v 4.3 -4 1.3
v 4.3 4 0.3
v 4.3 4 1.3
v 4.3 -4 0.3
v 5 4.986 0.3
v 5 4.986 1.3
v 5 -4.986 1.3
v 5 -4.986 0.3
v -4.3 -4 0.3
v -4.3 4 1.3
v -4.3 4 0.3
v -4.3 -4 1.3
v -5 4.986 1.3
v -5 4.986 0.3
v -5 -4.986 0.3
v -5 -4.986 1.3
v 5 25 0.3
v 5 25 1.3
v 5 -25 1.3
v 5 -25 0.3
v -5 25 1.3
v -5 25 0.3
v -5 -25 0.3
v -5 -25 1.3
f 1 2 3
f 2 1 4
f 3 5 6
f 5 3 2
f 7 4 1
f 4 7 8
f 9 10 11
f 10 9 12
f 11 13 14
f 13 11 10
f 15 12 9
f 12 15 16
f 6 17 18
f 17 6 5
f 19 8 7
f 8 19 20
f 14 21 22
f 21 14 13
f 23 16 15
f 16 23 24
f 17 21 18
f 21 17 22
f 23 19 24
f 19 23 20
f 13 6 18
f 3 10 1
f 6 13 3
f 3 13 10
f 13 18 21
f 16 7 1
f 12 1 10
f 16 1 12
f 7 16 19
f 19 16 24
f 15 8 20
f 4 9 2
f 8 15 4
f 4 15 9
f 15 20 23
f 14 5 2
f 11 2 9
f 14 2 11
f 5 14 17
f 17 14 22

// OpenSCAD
// file: ../lib/BOSL2/std.scad
// Minimal BOSL2 compatibility shim for bundled gallery models.
// It implements only the helpers used by the imported OpenSCAD projects.

CENTER = [0, 0, 0];
BOTTOM = [0, 0, -1];
TOP = [0, 0, 1];
LEFT = [-1, 0, 0];
RIGHT = [1, 0, 0];
FRONT = [0, -1, 0];
BACK = [0, 1, 0];

module up(z=0) {
    translate([0, 0, z]) children();
}

module down(z=0) {
    translate([0, 0, -z]) children();
}

module attach(anchor=CENTER) {
    children();
}

module cuboid(size=[1, 1, 1], anchor=CENTER) {
    center = anchor == CENTER;
    translate(center ? [0, 0, 0] : [0, 0, size[2] / 2])
        cube(size, center=true);
    children();
}

module xcyl(h=1, r=1, anchor=CENTER) {
    center = anchor == CENTER;
    translate(center ? [0, 0, 0] : [h / 2, 0, 0])
        rotate([0, 90, 0])
            cylinder(h=h, r=r, center=true);
}
// main file
include <../lib/node_interface.scad>
node_receiver_transition_profile(0);
